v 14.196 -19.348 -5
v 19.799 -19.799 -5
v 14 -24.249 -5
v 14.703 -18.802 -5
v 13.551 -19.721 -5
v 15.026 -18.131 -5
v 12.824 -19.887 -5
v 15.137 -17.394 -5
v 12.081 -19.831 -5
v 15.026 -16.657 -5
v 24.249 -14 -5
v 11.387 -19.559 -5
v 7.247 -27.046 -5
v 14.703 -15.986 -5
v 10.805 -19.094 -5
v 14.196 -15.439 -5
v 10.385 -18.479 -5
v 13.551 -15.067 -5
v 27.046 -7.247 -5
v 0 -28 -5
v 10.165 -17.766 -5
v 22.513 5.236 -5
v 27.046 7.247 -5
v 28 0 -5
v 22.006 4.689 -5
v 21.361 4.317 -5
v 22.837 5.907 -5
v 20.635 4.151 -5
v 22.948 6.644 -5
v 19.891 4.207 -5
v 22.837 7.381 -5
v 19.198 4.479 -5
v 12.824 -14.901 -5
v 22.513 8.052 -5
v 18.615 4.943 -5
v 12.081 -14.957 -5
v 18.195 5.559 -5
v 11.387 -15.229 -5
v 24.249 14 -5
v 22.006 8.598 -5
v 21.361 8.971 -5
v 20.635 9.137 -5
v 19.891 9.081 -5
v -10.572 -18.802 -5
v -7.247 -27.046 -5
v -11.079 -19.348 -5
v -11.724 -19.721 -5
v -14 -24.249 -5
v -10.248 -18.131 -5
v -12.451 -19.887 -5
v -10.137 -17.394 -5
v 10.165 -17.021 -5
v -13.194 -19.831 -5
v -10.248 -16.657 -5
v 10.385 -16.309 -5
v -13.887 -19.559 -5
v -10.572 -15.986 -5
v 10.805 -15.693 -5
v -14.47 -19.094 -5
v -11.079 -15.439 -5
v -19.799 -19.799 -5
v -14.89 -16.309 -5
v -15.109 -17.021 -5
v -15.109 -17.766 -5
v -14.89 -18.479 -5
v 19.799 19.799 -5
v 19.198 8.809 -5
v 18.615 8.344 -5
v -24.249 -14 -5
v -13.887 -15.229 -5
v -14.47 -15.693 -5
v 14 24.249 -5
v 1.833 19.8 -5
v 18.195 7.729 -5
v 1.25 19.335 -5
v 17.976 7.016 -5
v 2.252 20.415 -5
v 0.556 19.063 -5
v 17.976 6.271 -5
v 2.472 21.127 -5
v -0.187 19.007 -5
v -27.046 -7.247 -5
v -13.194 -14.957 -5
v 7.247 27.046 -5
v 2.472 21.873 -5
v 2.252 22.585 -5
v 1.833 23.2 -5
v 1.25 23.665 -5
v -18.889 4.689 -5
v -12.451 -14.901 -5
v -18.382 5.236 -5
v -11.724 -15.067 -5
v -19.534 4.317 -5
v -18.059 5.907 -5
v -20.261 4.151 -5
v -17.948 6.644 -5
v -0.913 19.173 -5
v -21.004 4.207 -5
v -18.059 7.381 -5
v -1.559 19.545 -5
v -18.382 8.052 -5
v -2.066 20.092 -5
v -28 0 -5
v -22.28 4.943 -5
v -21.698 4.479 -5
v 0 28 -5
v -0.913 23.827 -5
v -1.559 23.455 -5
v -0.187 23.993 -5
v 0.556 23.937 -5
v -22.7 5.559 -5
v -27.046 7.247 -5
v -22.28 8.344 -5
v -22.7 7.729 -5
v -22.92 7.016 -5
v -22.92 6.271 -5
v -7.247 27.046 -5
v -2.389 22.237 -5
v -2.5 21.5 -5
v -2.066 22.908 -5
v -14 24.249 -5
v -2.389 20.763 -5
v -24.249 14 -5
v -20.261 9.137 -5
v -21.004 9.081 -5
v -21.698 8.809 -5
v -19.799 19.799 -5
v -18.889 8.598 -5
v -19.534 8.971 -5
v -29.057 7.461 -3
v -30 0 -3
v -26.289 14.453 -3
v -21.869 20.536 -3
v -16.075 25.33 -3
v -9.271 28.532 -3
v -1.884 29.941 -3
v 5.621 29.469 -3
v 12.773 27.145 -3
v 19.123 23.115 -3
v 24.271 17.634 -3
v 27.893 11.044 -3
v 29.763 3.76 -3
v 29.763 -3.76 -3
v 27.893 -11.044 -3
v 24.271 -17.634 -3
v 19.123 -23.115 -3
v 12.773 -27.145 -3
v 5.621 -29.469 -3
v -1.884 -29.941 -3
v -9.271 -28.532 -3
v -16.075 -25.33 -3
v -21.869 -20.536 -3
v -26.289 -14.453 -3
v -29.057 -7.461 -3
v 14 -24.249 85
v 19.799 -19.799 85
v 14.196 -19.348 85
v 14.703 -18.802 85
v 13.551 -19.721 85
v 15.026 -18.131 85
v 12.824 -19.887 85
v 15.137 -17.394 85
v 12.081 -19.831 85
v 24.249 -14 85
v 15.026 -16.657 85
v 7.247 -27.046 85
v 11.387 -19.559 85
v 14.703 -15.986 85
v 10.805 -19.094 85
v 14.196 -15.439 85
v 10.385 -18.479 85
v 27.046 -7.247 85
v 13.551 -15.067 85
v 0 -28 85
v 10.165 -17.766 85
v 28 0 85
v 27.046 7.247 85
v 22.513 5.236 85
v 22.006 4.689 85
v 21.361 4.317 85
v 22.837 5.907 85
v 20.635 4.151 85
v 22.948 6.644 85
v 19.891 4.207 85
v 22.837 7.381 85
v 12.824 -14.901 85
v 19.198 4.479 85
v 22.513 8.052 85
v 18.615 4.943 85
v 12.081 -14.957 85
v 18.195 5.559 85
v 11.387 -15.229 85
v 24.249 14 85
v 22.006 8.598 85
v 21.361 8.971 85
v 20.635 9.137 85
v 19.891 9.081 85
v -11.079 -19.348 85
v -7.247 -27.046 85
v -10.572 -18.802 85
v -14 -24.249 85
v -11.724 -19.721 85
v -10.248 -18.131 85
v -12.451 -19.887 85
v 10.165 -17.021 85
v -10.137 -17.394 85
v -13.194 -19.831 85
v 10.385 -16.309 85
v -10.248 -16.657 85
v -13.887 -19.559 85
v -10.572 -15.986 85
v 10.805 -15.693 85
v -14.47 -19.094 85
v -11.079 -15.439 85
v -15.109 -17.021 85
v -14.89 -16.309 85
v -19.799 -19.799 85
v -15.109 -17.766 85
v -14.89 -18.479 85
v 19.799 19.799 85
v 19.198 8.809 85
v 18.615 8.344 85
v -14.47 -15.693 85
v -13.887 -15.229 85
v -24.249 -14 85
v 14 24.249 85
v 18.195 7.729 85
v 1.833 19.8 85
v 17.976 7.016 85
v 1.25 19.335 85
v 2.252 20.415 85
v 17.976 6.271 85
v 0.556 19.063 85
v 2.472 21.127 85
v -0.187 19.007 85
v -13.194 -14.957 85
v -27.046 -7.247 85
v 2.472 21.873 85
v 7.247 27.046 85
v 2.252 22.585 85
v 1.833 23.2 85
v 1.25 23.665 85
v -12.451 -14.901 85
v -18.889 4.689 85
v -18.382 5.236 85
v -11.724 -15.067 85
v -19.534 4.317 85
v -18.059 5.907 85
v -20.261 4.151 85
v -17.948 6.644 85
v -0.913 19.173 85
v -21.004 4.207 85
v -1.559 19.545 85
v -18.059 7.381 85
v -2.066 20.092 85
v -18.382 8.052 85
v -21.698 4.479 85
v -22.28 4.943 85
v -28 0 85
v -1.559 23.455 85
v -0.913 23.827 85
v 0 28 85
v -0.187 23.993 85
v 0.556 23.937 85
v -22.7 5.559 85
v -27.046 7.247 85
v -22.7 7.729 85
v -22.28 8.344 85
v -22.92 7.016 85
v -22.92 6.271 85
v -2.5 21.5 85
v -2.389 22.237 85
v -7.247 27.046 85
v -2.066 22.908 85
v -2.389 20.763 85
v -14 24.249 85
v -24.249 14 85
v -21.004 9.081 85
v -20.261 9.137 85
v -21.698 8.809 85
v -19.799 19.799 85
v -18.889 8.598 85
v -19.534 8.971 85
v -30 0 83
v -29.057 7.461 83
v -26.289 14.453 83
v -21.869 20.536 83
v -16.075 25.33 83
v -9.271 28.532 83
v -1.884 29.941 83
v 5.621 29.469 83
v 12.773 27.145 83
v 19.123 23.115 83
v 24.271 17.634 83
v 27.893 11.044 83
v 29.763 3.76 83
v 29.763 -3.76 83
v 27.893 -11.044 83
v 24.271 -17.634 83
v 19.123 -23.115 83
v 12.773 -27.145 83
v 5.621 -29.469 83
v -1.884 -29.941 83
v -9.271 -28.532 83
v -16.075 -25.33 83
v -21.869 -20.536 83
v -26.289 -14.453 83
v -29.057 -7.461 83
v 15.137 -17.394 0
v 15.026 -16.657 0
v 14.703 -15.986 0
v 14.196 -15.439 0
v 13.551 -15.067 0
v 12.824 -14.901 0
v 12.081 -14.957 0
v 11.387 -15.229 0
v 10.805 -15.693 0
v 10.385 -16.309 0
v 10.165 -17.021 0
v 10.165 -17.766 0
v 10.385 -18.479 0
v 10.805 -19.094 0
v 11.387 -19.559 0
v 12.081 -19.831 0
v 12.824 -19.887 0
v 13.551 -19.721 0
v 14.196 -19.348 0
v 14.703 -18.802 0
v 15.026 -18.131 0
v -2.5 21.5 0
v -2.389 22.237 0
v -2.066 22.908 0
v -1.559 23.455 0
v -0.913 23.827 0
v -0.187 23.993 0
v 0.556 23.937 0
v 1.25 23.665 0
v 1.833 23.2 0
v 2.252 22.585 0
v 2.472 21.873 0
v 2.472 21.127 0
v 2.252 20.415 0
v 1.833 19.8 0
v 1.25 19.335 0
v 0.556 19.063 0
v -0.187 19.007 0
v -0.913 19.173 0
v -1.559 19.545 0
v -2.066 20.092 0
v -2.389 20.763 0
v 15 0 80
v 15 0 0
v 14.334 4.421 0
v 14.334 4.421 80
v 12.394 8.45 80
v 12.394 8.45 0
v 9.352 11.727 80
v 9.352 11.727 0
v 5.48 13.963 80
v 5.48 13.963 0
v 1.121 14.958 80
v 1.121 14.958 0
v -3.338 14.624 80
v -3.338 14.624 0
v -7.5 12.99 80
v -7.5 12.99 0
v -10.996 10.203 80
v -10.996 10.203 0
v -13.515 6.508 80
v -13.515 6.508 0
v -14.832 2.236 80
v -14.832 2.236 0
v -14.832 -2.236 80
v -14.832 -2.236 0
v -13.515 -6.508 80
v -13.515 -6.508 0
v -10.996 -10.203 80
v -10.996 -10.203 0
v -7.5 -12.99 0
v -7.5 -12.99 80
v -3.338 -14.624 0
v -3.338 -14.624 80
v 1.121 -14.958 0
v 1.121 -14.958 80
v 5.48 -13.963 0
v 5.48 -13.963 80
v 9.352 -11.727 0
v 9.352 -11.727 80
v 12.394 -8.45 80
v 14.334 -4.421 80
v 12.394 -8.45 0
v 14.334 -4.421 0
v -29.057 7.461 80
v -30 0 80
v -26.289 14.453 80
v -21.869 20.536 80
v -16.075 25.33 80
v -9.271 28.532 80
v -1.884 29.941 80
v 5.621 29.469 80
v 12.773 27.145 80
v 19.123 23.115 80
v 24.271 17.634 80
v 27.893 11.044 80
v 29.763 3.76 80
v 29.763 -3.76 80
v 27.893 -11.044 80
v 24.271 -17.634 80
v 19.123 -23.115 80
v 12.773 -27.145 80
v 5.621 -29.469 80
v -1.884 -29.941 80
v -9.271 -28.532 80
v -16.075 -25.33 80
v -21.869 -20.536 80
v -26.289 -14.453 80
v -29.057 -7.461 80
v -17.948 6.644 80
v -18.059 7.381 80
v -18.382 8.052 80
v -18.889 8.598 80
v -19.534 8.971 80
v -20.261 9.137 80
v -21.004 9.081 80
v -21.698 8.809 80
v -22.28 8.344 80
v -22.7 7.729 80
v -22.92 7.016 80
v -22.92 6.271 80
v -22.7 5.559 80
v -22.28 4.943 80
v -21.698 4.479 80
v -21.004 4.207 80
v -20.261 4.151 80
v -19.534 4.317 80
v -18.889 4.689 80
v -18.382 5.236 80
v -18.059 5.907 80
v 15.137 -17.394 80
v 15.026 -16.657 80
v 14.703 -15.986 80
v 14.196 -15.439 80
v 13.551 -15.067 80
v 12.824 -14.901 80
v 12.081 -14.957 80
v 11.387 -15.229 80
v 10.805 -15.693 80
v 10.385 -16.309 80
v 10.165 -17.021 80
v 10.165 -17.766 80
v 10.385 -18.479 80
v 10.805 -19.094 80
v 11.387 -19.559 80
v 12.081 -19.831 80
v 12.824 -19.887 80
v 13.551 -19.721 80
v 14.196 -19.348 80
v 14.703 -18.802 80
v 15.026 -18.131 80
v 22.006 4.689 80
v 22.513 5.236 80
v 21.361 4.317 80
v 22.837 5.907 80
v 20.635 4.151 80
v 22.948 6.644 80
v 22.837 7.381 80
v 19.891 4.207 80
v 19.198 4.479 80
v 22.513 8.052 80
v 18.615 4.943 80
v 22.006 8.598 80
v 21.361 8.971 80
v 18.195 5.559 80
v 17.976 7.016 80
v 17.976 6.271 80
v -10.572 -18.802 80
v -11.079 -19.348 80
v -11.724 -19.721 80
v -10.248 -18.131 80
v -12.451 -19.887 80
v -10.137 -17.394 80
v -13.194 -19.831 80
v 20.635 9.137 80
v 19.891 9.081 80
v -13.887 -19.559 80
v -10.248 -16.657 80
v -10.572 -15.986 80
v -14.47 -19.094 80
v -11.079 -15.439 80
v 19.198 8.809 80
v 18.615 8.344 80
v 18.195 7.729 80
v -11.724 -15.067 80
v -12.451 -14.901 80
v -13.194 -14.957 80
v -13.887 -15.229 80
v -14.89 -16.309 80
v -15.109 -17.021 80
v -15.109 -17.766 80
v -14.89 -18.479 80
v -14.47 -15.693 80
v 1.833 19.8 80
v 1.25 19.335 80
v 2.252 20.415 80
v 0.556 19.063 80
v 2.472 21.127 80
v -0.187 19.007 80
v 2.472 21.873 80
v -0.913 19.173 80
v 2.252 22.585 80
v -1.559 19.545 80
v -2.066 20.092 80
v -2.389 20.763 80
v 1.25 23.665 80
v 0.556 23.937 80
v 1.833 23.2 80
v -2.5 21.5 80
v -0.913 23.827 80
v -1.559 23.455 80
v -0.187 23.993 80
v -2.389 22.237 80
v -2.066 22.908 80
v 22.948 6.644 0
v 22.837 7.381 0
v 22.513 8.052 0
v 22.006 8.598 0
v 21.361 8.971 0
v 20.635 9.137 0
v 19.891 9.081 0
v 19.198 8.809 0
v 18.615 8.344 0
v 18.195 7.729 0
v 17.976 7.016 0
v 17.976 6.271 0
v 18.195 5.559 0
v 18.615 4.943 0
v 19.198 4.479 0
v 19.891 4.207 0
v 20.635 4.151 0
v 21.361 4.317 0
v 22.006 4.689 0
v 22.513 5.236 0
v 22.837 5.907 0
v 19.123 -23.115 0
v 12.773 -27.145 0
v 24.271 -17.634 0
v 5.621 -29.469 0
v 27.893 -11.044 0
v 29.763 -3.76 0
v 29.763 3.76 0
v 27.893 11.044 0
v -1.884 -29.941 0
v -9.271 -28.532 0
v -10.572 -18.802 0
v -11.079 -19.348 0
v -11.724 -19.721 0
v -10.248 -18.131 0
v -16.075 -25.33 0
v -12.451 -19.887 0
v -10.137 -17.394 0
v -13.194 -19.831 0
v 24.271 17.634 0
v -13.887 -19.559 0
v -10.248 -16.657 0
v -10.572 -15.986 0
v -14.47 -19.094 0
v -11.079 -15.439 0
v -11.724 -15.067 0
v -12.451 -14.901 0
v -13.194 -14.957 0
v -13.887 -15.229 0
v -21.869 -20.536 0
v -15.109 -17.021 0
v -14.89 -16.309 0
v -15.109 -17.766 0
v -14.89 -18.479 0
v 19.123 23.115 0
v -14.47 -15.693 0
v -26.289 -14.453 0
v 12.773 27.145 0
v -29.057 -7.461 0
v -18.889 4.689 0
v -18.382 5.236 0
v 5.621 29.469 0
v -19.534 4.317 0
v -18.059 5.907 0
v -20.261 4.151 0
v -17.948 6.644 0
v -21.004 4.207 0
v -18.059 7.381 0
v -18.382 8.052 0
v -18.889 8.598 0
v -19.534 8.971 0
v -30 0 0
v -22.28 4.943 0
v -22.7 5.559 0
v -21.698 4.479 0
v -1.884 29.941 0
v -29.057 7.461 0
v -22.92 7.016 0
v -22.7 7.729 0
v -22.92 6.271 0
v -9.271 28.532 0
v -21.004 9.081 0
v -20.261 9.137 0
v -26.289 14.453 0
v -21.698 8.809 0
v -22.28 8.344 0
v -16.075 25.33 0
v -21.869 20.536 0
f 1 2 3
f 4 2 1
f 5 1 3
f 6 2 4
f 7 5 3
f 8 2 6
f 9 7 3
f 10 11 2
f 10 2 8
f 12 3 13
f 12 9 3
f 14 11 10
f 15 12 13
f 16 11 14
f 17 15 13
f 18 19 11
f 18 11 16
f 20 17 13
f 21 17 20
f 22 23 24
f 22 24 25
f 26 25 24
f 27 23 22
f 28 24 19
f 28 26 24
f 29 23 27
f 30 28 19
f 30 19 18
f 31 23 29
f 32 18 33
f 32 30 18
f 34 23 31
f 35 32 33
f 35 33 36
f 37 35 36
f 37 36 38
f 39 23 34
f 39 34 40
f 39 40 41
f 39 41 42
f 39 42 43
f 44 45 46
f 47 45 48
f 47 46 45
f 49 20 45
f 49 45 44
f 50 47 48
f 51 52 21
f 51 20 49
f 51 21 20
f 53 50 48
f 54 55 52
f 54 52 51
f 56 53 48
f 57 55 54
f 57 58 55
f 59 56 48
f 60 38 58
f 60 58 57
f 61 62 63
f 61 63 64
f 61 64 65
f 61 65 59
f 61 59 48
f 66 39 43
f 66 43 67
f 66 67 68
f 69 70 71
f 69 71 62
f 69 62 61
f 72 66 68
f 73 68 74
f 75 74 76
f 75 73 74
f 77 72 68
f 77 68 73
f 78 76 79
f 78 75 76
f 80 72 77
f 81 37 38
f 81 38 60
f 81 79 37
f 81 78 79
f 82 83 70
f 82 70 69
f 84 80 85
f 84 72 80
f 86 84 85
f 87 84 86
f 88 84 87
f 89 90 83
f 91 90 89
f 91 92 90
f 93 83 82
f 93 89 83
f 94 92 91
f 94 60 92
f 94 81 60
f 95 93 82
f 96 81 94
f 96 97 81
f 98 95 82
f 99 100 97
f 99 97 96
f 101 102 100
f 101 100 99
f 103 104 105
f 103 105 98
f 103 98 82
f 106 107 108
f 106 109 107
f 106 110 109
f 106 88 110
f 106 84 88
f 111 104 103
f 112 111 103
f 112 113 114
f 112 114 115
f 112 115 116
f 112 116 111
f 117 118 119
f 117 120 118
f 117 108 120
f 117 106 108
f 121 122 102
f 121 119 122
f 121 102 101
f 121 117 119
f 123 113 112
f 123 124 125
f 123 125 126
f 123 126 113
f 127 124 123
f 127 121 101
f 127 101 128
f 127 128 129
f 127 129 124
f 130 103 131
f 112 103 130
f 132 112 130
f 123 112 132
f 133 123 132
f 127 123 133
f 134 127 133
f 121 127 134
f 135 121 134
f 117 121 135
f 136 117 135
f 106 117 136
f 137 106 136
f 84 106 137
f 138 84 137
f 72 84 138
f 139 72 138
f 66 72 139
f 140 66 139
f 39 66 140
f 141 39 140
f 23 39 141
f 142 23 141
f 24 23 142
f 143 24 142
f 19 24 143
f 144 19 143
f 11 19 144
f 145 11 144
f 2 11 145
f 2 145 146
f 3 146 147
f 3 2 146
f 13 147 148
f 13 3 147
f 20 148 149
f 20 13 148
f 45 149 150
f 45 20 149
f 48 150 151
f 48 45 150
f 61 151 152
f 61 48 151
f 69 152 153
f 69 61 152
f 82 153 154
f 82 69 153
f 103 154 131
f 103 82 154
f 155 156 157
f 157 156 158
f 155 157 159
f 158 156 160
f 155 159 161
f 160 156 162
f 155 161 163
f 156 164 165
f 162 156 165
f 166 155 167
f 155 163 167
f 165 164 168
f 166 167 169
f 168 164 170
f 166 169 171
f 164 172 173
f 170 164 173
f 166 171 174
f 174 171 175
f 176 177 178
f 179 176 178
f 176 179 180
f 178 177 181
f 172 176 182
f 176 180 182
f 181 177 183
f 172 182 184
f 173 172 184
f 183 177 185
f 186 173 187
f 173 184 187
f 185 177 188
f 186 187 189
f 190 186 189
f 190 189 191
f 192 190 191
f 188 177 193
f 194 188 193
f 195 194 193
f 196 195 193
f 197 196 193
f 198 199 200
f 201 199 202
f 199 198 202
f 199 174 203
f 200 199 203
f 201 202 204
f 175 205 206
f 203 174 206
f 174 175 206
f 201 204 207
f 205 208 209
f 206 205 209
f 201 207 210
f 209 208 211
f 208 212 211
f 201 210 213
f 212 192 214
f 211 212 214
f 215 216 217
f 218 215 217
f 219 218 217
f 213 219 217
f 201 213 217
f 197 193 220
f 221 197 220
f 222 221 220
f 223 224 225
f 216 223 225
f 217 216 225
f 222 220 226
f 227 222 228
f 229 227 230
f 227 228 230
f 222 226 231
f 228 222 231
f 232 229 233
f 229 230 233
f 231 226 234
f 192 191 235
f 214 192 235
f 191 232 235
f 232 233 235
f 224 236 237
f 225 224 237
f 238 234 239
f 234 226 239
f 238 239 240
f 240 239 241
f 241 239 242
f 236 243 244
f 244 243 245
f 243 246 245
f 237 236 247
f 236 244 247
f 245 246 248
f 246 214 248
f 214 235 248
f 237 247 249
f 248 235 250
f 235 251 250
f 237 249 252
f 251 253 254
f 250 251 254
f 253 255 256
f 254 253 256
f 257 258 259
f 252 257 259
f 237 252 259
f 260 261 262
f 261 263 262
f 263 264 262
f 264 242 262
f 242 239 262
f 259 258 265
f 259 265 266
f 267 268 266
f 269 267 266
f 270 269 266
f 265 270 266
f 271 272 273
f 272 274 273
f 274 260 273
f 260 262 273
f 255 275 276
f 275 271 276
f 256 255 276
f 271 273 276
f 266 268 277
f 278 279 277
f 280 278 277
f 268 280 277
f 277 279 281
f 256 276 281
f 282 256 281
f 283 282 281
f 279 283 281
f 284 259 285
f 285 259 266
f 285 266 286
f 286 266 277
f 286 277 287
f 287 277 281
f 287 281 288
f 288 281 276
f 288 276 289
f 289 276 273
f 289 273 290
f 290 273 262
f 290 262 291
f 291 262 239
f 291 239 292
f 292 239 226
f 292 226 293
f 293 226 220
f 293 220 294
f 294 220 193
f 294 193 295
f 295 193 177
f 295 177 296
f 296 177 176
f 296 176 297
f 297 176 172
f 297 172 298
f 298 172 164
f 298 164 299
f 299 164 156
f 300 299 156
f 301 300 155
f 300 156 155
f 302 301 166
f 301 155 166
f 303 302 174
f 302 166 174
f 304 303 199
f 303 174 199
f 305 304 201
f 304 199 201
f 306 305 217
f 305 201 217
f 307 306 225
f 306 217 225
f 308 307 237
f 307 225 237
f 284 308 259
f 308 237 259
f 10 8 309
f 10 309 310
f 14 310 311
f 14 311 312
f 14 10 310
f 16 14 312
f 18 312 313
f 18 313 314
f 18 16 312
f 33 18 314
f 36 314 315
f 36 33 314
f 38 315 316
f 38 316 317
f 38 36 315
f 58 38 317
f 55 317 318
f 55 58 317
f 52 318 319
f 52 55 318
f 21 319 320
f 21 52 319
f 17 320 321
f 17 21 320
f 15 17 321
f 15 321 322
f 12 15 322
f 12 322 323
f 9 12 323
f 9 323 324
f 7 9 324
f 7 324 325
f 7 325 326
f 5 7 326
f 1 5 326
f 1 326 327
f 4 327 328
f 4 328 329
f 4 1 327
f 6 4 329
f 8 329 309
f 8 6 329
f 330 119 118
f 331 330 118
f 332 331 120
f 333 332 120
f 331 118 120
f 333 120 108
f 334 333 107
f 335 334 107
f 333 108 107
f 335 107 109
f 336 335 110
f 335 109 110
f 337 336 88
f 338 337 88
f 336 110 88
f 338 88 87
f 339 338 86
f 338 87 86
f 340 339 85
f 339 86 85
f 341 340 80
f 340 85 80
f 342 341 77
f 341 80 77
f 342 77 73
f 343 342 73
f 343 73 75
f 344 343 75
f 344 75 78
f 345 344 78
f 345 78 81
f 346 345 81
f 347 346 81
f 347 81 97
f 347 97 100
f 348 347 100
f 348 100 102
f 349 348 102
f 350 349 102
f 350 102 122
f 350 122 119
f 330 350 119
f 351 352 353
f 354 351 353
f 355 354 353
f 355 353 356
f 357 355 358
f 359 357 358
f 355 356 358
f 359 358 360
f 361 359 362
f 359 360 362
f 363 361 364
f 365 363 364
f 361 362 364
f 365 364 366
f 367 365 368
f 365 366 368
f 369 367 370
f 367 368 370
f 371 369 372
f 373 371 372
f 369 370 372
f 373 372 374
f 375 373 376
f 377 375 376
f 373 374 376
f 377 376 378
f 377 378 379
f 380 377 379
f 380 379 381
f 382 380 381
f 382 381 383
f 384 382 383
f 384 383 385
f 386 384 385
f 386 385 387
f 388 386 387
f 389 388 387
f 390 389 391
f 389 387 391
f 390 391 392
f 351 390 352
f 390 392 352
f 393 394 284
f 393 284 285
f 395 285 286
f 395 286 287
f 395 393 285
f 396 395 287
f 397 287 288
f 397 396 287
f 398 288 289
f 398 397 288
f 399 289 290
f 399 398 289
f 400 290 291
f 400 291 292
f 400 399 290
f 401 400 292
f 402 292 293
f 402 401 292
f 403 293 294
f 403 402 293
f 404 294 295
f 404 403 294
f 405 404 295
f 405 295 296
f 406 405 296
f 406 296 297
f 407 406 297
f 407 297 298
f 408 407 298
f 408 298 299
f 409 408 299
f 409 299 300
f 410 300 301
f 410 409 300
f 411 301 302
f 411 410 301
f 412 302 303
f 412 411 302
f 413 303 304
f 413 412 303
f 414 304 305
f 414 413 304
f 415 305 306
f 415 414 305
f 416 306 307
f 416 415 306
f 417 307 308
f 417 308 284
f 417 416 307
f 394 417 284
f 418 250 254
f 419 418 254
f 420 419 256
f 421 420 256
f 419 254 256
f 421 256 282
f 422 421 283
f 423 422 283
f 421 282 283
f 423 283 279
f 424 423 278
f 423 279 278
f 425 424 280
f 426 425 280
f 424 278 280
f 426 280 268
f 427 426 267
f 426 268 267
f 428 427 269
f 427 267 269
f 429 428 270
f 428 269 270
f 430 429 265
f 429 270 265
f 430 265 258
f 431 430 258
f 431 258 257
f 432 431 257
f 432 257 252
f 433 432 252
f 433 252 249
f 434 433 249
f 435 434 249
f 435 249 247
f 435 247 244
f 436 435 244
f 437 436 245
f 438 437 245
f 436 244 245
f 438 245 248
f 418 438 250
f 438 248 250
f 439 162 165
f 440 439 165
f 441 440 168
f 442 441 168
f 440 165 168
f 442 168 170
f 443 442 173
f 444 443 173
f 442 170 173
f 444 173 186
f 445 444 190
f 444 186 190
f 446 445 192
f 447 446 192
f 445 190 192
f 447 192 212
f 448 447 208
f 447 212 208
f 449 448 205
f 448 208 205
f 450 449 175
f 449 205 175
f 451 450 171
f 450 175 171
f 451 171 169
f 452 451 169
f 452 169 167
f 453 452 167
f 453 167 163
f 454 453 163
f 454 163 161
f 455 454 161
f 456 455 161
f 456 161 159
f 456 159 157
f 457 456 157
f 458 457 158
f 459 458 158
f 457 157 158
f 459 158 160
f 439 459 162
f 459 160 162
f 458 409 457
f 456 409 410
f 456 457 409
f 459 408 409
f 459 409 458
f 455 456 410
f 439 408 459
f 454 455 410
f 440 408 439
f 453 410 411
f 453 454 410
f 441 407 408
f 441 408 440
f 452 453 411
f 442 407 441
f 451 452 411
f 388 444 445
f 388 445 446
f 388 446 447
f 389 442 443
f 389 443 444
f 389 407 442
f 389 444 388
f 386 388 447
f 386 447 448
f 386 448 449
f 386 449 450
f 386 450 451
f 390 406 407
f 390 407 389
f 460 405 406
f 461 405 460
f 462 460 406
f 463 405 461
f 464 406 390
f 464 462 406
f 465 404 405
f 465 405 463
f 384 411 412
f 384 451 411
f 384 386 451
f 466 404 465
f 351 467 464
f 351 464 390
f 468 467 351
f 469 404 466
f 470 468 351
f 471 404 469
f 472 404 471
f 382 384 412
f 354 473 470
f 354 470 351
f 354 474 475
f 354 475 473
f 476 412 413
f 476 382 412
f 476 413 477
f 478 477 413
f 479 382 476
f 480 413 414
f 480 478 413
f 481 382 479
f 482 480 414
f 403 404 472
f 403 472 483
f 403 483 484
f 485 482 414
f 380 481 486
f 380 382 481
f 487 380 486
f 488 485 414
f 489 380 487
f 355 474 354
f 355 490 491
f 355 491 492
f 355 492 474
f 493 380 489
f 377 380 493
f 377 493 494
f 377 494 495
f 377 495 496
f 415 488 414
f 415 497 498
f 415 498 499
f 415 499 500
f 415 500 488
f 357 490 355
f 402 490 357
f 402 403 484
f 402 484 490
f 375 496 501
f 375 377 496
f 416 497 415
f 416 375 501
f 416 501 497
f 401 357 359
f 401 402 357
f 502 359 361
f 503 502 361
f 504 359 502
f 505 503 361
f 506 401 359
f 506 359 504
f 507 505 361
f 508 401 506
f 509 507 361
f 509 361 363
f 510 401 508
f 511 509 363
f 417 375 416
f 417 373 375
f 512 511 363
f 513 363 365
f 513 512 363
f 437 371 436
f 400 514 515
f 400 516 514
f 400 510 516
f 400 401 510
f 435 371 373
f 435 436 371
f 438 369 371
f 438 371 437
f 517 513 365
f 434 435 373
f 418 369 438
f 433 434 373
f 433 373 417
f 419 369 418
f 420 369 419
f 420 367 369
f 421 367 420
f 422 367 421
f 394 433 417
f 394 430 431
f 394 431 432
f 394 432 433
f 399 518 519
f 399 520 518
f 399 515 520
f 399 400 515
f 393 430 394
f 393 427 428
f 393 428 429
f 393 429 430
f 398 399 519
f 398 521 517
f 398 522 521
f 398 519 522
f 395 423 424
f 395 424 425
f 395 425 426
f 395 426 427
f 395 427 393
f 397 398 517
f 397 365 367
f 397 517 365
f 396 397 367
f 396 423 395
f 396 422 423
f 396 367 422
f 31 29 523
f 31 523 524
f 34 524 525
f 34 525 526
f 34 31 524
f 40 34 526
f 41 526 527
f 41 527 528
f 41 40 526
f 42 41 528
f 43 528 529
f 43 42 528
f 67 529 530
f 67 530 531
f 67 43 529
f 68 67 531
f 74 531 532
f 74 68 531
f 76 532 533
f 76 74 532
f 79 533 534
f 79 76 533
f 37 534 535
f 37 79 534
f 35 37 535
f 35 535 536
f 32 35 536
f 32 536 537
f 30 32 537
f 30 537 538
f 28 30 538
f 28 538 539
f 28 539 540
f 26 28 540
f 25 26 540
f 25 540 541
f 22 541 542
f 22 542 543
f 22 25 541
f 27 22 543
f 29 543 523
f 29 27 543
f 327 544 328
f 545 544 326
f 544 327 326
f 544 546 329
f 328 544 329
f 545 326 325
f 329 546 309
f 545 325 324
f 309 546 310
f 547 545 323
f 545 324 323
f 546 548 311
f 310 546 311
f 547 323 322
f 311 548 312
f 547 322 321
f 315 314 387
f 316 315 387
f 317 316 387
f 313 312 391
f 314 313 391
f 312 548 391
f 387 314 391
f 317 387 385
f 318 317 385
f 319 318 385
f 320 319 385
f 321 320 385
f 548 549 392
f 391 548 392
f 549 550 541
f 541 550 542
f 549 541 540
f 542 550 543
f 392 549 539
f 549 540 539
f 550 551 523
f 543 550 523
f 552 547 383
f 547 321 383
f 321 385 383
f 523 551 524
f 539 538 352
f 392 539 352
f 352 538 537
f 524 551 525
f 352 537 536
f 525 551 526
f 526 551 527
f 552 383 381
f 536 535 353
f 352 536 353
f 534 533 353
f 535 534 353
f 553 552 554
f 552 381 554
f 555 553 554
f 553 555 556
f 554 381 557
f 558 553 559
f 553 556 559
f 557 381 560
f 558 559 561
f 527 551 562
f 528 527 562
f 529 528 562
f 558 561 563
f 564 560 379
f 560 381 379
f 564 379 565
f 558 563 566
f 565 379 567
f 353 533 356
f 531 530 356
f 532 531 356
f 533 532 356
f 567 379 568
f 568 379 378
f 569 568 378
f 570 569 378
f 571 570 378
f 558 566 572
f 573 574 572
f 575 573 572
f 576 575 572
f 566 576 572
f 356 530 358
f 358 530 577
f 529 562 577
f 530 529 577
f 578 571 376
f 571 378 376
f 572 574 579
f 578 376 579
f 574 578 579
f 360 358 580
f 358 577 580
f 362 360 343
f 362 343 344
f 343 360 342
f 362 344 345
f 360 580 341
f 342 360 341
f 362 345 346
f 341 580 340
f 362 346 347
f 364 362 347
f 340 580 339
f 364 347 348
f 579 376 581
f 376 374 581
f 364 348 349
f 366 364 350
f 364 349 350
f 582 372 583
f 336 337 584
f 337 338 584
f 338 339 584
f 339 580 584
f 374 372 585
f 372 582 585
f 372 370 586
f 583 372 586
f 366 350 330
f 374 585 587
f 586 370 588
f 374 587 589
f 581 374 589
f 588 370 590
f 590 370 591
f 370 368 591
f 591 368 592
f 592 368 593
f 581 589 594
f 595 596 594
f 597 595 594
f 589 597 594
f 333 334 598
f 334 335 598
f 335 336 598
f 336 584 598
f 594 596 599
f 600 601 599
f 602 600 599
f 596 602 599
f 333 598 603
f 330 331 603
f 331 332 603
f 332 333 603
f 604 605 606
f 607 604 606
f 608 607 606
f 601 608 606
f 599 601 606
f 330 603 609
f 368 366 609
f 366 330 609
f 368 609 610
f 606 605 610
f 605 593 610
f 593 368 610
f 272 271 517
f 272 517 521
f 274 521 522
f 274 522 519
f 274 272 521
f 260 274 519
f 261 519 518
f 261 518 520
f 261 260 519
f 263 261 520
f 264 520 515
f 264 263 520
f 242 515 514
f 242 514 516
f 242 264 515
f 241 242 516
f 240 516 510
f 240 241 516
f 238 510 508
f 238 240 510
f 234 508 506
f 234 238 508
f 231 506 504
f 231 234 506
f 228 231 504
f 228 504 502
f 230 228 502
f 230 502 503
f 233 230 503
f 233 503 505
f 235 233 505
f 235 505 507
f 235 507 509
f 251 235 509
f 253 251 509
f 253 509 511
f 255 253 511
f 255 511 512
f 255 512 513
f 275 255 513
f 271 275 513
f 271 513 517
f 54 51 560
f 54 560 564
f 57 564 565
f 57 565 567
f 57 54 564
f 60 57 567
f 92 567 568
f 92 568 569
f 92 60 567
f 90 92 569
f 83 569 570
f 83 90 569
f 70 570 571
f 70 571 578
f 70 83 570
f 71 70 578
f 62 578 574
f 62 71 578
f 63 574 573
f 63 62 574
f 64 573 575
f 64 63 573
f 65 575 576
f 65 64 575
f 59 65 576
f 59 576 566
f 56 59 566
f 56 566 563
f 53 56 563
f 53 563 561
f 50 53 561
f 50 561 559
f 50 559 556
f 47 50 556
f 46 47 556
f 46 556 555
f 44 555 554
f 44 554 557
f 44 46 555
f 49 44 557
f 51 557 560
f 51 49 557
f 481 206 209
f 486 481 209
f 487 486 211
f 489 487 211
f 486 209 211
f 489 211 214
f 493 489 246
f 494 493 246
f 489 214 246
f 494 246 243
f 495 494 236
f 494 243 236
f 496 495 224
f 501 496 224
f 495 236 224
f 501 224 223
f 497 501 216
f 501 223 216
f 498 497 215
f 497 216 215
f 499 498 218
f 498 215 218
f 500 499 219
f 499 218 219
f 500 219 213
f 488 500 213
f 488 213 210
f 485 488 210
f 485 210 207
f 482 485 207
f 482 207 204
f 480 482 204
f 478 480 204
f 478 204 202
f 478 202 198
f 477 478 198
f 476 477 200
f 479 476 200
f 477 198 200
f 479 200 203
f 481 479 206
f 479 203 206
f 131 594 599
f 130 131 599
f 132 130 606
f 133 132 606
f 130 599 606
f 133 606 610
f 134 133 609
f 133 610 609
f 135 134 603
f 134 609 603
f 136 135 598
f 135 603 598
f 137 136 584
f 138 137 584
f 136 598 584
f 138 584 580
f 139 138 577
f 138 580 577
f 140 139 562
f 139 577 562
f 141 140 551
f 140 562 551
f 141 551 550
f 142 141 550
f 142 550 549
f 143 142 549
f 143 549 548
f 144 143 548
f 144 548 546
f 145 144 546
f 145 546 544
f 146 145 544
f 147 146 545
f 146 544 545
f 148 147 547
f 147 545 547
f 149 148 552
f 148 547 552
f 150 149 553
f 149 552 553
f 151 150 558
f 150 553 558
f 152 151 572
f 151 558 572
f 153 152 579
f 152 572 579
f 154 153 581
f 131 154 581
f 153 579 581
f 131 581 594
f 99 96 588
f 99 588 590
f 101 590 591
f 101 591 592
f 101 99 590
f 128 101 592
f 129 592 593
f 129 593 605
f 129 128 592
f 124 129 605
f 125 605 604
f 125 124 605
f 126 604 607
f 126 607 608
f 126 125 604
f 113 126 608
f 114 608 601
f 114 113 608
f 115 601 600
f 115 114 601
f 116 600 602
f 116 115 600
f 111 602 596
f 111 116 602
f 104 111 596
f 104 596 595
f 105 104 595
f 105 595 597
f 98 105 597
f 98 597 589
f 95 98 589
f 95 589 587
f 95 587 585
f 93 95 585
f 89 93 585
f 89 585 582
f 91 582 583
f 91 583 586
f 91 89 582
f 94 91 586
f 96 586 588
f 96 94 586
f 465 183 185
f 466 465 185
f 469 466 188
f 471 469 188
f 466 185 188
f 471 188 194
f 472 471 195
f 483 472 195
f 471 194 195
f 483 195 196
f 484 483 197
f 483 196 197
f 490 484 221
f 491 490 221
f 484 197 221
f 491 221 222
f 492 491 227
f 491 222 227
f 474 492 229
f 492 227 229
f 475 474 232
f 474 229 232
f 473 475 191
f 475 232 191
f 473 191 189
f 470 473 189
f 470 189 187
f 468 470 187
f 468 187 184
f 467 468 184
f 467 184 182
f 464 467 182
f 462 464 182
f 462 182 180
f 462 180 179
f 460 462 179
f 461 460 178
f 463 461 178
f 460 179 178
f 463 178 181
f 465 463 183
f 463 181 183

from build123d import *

# Parameters (mm, degrees)
SKETCH1_R                = 15
BOSS_EXTRUDE1_DEPTH      = 80
SKETCH2_R                = 30
BOSS_EXTRUDE2_DEPTH      = 5
CHAMFER1_SIZE            = 2
SKETCH3_R                = 2.5
CUT_EXTRUDE1_DEPTH       = 96
CIRPATTERN5_COUNT        = 5
MIRROR3_COPY_1_SKETCH_R  = 2.5
MIRROR3_COPY_1_DEPTH     = 96
MIRROR3_COPY_2_SKETCH_R  = 2.5
MIRROR3_COPY_2_DEPTH     = 96
MIRROR3_COPY_3_SKETCH_R  = 2.5
MIRROR3_COPY_3_DEPTH     = 96
MIRROR3_COPY_4_SKETCH_R  = 2.5
MIRROR3_COPY_4_DEPTH     = 96
MIRROR3_COPY_5_SKETCH_R  = 2.5
MIRROR3_COPY_5_DEPTH     = 96
CHAMFER1_OF_MIRROR3_SIZE = 2


with BuildPart() as part:
    # Sketch1 → Boss-Extrude1 (new body)
    with BuildSketch(Plane.XY):
        Circle(SKETCH1_R)
    extrude(amount=BOSS_EXTRUDE1_DEPTH)

    # Sketch2 → Boss-Extrude2 (add)
    with BuildSketch(Plane(origin=(0, 0, 0), x_dir=(-1, 0, 0), z_dir=(0, 0, -1))):
        Circle(SKETCH2_R)
    boss_extrude2 = extrude(amount=BOSS_EXTRUDE2_DEPTH)

    # Chamfer1
    chamfer1_edges = [part.edges().sort_by_distance(p)[0] for p in [
        (30, 0, -5),
    ]]
    chamfer(chamfer1_edges, length=CHAMFER1_SIZE)

    # Sketch3 → Cut-Extrude1 (cut, through all)
    with BuildSketch(Plane(origin=(0, 0, -5), x_dir=(-1, 0, 0), z_dir=(0, 0, -1))):
        with Locations((0, 21.5)):
            Circle(SKETCH3_R)
    cut_extrude1 = extrude(amount=-CUT_EXTRUDE1_DEPTH, mode=Mode.SUBTRACT)

    # CirPattern5: Cut-Extrude1 ×5 about axis
    cirpattern5_axis = Axis((0, 0, -5), (0, 0, 1))
    for i in range(1, CIRPATTERN5_COUNT):
        add(cut_extrude1.rotate(cirpattern5_axis, i * 360 / CIRPATTERN5_COUNT), mode=Mode.SUBTRACT)

    # Mirror3: Boss-Extrude2 across plane
    add(boss_extrude2.mirror(Plane.XY.offset(40)))

    # Mirror3 copy 1 sketch → Mirror3 copy 1 (cut, through all)
    with BuildSketch(Plane(origin=(0, 0, 85), x_dir=(-0.30901699437494745, -0.9510565162951535, 0), z_dir=(0, 0, 1))):
        with Locations((0, -21.5)):
            Circle(MIRROR3_COPY_1_SKETCH_R)
    extrude(amount=-MIRROR3_COPY_1_DEPTH, mode=Mode.SUBTRACT)

    # Mirror3 copy 2 sketch → Mirror3 copy 2 (cut, through all)
    with BuildSketch(Plane(origin=(0, 0, 85), x_dir=(0.8090169943749473, -0.5877852522924732, 0), z_dir=(0, 0, 1))):
        with Locations((0, -21.5)):
            Circle(MIRROR3_COPY_2_SKETCH_R)
    extrude(amount=-MIRROR3_COPY_2_DEPTH, mode=Mode.SUBTRACT)

    # Mirror3 copy 3 sketch → Mirror3 copy 3 (cut, through all)
    with BuildSketch(Plane(origin=(0, 0, 85), x_dir=(0.8090169943749476, 0.587785252292473, 0), z_dir=(0, 0, 1))):
        with Locations((0, -21.5)):
            Circle(MIRROR3_COPY_3_SKETCH_R)
    extrude(amount=-MIRROR3_COPY_3_DEPTH, mode=Mode.SUBTRACT)

    # Mirror3 copy 4 sketch → Mirror3 copy 4 (cut, through all)
    with BuildSketch(Plane(origin=(0, 0, 85), x_dir=(-0.30901699437494723, 0.9510565162951536, 0), z_dir=(0, 0, 1))):
        with Locations((0, -21.5)):
            Circle(MIRROR3_COPY_4_SKETCH_R)
    extrude(amount=-MIRROR3_COPY_4_DEPTH, mode=Mode.SUBTRACT)

    # Mirror3 copy 5 sketch → Mirror3 copy 5 (cut, through all)
    with BuildSketch(Plane(origin=(0, 0, 85), x_dir=(-1, 0, 0), z_dir=(0, 0, 1))):
        with Locations((0, -21.5)):
            Circle(MIRROR3_COPY_5_SKETCH_R)
    extrude(amount=-MIRROR3_COPY_5_DEPTH, mode=Mode.SUBTRACT)

    # Chamfer1 of Mirror3
    chamfer1_of_mirror3_edges = [part.edges().sort_by_distance(p)[0] for p in [
        (30, 0, 85),
    ]]
    chamfer(chamfer1_of_mirror3_edges, length=CHAMFER1_OF_MIRROR3_SIZE)


solid = part.part
